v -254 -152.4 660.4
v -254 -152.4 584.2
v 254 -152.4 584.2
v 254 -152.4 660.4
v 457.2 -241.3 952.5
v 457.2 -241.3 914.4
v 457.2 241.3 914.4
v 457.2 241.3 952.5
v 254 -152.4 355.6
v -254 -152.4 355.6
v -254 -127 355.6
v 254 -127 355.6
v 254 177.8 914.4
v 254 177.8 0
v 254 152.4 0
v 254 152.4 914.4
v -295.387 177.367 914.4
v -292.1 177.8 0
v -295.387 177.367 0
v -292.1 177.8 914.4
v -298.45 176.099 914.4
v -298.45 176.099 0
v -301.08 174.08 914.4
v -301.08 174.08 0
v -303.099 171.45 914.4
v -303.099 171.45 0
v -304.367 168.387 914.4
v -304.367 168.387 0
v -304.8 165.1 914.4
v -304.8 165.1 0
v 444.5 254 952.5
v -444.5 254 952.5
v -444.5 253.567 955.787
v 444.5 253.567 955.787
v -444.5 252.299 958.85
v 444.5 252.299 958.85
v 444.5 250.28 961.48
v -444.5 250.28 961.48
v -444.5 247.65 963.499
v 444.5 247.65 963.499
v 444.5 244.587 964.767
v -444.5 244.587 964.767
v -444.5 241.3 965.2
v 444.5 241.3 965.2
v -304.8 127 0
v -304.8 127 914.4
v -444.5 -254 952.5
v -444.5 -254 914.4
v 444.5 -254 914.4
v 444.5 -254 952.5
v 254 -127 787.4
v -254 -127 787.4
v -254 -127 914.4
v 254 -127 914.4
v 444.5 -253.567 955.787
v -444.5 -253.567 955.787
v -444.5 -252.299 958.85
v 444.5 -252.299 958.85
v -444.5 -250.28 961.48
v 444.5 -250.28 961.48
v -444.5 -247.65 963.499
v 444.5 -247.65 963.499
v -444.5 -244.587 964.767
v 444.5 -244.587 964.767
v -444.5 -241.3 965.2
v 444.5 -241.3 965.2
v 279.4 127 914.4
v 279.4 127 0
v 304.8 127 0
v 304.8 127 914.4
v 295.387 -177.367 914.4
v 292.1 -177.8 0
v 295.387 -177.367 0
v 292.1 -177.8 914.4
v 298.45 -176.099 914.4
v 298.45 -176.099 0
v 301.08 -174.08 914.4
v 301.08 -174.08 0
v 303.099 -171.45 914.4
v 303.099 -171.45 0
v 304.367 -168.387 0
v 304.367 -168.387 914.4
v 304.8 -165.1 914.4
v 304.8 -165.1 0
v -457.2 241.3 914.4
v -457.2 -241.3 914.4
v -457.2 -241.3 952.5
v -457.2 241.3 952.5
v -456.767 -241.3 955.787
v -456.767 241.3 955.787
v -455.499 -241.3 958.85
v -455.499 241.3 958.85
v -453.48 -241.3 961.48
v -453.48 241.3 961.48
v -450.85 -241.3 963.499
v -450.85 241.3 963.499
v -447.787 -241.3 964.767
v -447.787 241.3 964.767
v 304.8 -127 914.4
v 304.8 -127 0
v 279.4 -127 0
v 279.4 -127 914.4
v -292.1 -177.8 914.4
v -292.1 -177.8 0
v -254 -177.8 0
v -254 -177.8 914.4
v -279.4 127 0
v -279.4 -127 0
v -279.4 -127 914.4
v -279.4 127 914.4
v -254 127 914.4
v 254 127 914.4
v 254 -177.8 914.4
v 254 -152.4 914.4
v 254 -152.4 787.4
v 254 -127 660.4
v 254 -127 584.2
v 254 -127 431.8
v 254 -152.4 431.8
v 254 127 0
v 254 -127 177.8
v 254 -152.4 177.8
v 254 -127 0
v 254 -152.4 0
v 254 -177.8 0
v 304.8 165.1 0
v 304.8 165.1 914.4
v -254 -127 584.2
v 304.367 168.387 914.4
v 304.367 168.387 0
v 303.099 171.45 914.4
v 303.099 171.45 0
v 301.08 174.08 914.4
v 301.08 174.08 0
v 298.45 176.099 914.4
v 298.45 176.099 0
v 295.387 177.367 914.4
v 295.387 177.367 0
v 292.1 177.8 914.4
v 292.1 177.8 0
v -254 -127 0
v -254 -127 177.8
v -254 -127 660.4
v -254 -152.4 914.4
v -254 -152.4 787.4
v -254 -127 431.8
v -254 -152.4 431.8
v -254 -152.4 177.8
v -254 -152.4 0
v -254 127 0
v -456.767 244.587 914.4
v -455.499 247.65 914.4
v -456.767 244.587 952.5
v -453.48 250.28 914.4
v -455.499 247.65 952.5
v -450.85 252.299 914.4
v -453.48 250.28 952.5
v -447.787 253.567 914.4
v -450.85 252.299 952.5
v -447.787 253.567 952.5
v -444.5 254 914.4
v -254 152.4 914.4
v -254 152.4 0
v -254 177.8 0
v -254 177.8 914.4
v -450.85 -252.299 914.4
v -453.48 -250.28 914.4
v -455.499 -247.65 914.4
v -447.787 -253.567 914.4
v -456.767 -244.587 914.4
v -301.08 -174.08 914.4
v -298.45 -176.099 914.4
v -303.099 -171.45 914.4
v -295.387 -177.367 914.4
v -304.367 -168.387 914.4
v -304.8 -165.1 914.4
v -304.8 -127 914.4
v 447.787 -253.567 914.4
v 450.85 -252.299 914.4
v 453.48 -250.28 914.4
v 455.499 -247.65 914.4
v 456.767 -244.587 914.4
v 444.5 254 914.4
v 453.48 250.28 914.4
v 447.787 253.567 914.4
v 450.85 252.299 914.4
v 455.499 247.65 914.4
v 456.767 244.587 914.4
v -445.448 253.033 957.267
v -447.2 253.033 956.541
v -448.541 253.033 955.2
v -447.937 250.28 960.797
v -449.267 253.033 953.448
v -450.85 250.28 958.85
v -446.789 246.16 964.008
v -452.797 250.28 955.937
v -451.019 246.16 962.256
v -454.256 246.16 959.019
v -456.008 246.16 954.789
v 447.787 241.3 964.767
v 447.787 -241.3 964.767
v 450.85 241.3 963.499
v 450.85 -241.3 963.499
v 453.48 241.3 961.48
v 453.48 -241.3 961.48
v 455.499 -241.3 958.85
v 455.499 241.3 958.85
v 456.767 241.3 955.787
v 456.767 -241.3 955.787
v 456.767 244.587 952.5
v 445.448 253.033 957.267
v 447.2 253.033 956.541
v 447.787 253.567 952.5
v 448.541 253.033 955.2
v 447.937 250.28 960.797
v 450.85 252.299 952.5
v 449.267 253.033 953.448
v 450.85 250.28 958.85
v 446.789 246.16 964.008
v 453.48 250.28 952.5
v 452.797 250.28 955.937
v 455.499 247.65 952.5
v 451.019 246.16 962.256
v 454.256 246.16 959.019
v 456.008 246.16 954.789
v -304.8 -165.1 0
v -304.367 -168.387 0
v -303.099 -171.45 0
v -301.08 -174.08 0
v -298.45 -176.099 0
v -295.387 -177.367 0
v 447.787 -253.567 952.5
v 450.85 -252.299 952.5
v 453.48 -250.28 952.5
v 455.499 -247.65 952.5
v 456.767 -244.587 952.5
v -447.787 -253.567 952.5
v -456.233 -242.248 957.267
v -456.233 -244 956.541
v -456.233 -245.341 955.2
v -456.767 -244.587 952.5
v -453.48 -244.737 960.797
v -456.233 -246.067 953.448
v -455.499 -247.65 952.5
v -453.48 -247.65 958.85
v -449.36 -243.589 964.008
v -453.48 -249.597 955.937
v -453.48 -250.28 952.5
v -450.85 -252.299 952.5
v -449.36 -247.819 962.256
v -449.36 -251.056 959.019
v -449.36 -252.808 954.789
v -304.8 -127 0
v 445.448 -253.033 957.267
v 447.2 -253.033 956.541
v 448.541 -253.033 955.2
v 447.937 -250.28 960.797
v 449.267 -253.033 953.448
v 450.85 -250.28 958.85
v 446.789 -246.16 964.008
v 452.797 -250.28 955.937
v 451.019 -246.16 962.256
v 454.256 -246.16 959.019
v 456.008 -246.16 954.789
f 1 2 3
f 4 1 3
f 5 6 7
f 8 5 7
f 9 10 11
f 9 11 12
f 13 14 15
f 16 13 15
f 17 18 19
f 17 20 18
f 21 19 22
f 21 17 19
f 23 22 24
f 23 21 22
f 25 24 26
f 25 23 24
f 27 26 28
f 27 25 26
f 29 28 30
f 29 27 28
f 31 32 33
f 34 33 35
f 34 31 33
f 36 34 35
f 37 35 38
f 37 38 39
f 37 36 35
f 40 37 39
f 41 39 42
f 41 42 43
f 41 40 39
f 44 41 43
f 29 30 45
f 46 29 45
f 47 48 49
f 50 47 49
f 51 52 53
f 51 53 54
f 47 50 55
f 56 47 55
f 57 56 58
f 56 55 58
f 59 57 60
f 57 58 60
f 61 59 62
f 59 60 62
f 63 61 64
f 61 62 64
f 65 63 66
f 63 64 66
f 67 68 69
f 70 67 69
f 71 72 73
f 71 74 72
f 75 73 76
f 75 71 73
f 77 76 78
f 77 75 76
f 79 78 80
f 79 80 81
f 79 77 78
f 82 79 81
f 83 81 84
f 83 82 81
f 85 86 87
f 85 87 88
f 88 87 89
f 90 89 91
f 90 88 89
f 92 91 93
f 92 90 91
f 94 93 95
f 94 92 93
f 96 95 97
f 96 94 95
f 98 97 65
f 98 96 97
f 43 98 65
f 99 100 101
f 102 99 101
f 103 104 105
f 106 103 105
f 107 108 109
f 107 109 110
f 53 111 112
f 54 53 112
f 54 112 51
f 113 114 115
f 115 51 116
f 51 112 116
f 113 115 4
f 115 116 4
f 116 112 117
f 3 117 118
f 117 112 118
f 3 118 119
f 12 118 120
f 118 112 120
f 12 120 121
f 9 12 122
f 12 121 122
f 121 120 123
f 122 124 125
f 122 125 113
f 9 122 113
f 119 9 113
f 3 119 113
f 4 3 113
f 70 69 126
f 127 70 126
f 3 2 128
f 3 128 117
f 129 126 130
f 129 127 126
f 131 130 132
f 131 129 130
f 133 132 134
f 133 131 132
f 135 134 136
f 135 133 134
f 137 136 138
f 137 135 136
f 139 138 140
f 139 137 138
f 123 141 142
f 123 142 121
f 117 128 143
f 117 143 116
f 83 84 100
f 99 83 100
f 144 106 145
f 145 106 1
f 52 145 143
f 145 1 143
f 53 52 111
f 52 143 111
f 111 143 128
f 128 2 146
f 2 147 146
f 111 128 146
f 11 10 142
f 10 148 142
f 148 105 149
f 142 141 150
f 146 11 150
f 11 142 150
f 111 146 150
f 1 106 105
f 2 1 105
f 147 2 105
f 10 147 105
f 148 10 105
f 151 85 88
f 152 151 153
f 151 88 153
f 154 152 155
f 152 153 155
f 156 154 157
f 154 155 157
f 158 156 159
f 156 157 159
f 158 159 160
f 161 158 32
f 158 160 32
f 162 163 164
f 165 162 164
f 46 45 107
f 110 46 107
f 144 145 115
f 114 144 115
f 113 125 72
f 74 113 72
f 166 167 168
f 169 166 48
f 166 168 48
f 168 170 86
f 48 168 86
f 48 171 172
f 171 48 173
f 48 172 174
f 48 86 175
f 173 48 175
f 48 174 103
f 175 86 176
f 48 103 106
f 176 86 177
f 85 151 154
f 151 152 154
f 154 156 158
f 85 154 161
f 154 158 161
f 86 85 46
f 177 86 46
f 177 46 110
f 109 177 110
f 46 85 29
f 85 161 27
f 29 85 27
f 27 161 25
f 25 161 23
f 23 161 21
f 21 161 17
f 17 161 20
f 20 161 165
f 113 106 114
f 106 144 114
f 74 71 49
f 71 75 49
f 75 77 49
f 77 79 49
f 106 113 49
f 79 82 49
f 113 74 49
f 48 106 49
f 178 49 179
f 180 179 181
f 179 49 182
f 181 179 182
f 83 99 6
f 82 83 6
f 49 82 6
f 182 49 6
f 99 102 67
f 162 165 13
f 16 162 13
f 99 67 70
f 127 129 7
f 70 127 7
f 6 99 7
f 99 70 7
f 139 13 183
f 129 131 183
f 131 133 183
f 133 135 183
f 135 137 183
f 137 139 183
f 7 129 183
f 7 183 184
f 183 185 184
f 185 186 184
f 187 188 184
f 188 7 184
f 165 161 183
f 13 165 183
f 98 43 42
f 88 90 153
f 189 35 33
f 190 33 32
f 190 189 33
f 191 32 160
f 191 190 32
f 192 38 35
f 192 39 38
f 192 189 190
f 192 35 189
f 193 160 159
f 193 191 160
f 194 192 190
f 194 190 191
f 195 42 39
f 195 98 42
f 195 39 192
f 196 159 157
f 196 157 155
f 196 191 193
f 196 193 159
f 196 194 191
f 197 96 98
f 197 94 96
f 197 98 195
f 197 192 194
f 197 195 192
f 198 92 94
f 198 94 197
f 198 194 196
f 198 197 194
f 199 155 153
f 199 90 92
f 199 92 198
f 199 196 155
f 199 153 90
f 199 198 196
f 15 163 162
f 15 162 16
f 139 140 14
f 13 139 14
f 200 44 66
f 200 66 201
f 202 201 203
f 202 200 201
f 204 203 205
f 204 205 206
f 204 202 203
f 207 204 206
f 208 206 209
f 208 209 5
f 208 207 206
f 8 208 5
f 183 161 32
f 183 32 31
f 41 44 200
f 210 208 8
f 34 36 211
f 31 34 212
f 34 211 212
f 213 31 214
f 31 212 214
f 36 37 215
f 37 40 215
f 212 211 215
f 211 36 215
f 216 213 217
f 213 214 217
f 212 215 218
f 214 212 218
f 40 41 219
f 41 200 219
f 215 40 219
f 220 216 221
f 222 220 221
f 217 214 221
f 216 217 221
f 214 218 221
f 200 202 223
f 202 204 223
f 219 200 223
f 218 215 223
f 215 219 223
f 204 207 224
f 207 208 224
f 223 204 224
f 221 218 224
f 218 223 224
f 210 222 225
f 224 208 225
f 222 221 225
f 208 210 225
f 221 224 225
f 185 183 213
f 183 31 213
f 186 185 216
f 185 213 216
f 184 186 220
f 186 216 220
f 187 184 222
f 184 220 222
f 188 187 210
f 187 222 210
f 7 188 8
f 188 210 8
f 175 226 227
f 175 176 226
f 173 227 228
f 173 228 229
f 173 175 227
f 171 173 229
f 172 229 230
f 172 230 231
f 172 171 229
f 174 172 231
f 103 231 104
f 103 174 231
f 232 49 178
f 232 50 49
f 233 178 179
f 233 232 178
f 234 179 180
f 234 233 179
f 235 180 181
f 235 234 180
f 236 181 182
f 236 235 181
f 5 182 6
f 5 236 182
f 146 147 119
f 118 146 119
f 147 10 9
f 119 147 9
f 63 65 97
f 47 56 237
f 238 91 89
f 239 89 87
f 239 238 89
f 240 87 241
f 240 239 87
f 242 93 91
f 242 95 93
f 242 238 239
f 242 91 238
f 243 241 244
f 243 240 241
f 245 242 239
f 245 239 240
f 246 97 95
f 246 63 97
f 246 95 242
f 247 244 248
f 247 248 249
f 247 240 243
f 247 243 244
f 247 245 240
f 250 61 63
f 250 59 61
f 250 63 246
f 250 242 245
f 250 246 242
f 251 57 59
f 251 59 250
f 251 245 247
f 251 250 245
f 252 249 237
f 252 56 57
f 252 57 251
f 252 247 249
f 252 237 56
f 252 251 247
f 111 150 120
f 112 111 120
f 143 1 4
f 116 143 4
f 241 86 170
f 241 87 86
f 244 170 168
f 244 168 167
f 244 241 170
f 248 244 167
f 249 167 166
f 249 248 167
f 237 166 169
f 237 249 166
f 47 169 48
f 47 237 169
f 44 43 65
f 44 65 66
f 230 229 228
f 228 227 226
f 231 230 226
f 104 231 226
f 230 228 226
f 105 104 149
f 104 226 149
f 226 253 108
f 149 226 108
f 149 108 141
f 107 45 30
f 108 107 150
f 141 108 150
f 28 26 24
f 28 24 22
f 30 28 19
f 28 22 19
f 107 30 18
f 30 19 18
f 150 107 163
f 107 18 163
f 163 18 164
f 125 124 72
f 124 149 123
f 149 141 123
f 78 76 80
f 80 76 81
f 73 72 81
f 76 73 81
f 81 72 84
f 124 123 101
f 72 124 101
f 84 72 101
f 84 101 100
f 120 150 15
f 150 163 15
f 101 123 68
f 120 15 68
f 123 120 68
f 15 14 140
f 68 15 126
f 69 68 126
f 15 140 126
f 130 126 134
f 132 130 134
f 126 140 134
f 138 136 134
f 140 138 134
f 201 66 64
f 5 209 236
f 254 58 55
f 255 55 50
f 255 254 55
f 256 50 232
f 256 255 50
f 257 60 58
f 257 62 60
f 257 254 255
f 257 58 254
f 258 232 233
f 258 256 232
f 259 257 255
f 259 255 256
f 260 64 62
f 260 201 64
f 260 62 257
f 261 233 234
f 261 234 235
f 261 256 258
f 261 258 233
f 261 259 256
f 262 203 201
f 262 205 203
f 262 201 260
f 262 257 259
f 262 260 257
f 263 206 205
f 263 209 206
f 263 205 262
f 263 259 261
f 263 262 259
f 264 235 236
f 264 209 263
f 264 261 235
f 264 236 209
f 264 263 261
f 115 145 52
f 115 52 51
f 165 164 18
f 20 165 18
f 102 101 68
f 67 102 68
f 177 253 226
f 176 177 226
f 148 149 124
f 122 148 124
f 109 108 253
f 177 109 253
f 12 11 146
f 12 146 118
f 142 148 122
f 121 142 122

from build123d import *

# Parameters (mm, degrees)
F0_W     = 25.4
F0_H     = 254
F0_W_2   = 508
F0_H_2   = 25.4
F1_DEPTH = 914.4
F2_W     = 914.4
F2_H     = 508
F3_DEPTH = 50.8
F4_W     = 508
F4_H     = 127
F4_H_2   = 152.4
F4_H_3   = 177.8
F5_DEPTH = 127
F6_R     = 12.7


with BuildPart() as f1:
    # F0 (on Top) → F1 (new body)
    with BuildSketch(Plane.XY):
        Polygon((-279.4, 127), (-254, 127), (-254, 152.4), (-254, 177.8), (-304.8, 177.8), (-304.8, 127), align=None)
        Polygon((-254, -177.8), (-254, -152.4), (-254, -127), (-279.4, -127), (-304.8, -127), (-304.8, -177.8), align=None)
        Polygon((254, -152.4), (254, -177.8), (304.8, -177.8), (304.8, -127), (279.4, -127), (254, -127), align=None)
        Polygon((254, 152.4), (254, 127), (279.4, 127), (304.8, 127), (304.8, 177.8), (254, 177.8), align=None)
        with Locations((-266.7, 0)):
            Rectangle(F0_W, F0_H)
        with Locations((0, 139.7)):
            Rectangle(F0_W_2, F0_H_2)
        with Locations((266.7, 0)):
            Rectangle(F0_W, F0_H)
        with Locations((0, -139.7)):
            Rectangle(F0_W_2, F0_H_2)
    extrude(amount=F1_DEPTH)

    # F2 (on face) → F3 (join)
    with BuildSketch(Plane.XY.offset(914.4)):
        Rectangle(F2_W, F2_H)
    extrude(amount=F3_DEPTH)

    # F4 (on face) → F5 (cut)
    with BuildSketch(Plane.XZ.offset(152.4)):
        with Locations((0, 723.9)):
            Rectangle(F4_W, F4_H)
        with Locations((0, 508)):
            Rectangle(F4_W, F4_H_2)
        with Locations((0, 266.7)):
            Rectangle(F4_W, F4_H_3)
    extrude(amount=-F5_DEPTH, mode=Mode.SUBTRACT)

    # F6
    f6_edges = [f1.edges().sort_by_distance(p)[0] for p in [
        (457.2, 0, 965.2),
        (0, -254, 965.2),
        (-457.2, 0, 965.2),
        (0, 254, 965.2),
        (457.2, -254, 939.8),
        (-457.2, -254, 939.8),
        (457.2, 254, 939.8),
        (-457.2, 254, 939.8),
        (304.8, -177.8, 457.2),
        (-304.8, -177.8, 457.2),
        (304.8, 177.8, 457.2),
        (-304.8, 177.8, 457.2),
    ]]
    fillet(f6_edges, radius=F6_R)


solid = f1.part
